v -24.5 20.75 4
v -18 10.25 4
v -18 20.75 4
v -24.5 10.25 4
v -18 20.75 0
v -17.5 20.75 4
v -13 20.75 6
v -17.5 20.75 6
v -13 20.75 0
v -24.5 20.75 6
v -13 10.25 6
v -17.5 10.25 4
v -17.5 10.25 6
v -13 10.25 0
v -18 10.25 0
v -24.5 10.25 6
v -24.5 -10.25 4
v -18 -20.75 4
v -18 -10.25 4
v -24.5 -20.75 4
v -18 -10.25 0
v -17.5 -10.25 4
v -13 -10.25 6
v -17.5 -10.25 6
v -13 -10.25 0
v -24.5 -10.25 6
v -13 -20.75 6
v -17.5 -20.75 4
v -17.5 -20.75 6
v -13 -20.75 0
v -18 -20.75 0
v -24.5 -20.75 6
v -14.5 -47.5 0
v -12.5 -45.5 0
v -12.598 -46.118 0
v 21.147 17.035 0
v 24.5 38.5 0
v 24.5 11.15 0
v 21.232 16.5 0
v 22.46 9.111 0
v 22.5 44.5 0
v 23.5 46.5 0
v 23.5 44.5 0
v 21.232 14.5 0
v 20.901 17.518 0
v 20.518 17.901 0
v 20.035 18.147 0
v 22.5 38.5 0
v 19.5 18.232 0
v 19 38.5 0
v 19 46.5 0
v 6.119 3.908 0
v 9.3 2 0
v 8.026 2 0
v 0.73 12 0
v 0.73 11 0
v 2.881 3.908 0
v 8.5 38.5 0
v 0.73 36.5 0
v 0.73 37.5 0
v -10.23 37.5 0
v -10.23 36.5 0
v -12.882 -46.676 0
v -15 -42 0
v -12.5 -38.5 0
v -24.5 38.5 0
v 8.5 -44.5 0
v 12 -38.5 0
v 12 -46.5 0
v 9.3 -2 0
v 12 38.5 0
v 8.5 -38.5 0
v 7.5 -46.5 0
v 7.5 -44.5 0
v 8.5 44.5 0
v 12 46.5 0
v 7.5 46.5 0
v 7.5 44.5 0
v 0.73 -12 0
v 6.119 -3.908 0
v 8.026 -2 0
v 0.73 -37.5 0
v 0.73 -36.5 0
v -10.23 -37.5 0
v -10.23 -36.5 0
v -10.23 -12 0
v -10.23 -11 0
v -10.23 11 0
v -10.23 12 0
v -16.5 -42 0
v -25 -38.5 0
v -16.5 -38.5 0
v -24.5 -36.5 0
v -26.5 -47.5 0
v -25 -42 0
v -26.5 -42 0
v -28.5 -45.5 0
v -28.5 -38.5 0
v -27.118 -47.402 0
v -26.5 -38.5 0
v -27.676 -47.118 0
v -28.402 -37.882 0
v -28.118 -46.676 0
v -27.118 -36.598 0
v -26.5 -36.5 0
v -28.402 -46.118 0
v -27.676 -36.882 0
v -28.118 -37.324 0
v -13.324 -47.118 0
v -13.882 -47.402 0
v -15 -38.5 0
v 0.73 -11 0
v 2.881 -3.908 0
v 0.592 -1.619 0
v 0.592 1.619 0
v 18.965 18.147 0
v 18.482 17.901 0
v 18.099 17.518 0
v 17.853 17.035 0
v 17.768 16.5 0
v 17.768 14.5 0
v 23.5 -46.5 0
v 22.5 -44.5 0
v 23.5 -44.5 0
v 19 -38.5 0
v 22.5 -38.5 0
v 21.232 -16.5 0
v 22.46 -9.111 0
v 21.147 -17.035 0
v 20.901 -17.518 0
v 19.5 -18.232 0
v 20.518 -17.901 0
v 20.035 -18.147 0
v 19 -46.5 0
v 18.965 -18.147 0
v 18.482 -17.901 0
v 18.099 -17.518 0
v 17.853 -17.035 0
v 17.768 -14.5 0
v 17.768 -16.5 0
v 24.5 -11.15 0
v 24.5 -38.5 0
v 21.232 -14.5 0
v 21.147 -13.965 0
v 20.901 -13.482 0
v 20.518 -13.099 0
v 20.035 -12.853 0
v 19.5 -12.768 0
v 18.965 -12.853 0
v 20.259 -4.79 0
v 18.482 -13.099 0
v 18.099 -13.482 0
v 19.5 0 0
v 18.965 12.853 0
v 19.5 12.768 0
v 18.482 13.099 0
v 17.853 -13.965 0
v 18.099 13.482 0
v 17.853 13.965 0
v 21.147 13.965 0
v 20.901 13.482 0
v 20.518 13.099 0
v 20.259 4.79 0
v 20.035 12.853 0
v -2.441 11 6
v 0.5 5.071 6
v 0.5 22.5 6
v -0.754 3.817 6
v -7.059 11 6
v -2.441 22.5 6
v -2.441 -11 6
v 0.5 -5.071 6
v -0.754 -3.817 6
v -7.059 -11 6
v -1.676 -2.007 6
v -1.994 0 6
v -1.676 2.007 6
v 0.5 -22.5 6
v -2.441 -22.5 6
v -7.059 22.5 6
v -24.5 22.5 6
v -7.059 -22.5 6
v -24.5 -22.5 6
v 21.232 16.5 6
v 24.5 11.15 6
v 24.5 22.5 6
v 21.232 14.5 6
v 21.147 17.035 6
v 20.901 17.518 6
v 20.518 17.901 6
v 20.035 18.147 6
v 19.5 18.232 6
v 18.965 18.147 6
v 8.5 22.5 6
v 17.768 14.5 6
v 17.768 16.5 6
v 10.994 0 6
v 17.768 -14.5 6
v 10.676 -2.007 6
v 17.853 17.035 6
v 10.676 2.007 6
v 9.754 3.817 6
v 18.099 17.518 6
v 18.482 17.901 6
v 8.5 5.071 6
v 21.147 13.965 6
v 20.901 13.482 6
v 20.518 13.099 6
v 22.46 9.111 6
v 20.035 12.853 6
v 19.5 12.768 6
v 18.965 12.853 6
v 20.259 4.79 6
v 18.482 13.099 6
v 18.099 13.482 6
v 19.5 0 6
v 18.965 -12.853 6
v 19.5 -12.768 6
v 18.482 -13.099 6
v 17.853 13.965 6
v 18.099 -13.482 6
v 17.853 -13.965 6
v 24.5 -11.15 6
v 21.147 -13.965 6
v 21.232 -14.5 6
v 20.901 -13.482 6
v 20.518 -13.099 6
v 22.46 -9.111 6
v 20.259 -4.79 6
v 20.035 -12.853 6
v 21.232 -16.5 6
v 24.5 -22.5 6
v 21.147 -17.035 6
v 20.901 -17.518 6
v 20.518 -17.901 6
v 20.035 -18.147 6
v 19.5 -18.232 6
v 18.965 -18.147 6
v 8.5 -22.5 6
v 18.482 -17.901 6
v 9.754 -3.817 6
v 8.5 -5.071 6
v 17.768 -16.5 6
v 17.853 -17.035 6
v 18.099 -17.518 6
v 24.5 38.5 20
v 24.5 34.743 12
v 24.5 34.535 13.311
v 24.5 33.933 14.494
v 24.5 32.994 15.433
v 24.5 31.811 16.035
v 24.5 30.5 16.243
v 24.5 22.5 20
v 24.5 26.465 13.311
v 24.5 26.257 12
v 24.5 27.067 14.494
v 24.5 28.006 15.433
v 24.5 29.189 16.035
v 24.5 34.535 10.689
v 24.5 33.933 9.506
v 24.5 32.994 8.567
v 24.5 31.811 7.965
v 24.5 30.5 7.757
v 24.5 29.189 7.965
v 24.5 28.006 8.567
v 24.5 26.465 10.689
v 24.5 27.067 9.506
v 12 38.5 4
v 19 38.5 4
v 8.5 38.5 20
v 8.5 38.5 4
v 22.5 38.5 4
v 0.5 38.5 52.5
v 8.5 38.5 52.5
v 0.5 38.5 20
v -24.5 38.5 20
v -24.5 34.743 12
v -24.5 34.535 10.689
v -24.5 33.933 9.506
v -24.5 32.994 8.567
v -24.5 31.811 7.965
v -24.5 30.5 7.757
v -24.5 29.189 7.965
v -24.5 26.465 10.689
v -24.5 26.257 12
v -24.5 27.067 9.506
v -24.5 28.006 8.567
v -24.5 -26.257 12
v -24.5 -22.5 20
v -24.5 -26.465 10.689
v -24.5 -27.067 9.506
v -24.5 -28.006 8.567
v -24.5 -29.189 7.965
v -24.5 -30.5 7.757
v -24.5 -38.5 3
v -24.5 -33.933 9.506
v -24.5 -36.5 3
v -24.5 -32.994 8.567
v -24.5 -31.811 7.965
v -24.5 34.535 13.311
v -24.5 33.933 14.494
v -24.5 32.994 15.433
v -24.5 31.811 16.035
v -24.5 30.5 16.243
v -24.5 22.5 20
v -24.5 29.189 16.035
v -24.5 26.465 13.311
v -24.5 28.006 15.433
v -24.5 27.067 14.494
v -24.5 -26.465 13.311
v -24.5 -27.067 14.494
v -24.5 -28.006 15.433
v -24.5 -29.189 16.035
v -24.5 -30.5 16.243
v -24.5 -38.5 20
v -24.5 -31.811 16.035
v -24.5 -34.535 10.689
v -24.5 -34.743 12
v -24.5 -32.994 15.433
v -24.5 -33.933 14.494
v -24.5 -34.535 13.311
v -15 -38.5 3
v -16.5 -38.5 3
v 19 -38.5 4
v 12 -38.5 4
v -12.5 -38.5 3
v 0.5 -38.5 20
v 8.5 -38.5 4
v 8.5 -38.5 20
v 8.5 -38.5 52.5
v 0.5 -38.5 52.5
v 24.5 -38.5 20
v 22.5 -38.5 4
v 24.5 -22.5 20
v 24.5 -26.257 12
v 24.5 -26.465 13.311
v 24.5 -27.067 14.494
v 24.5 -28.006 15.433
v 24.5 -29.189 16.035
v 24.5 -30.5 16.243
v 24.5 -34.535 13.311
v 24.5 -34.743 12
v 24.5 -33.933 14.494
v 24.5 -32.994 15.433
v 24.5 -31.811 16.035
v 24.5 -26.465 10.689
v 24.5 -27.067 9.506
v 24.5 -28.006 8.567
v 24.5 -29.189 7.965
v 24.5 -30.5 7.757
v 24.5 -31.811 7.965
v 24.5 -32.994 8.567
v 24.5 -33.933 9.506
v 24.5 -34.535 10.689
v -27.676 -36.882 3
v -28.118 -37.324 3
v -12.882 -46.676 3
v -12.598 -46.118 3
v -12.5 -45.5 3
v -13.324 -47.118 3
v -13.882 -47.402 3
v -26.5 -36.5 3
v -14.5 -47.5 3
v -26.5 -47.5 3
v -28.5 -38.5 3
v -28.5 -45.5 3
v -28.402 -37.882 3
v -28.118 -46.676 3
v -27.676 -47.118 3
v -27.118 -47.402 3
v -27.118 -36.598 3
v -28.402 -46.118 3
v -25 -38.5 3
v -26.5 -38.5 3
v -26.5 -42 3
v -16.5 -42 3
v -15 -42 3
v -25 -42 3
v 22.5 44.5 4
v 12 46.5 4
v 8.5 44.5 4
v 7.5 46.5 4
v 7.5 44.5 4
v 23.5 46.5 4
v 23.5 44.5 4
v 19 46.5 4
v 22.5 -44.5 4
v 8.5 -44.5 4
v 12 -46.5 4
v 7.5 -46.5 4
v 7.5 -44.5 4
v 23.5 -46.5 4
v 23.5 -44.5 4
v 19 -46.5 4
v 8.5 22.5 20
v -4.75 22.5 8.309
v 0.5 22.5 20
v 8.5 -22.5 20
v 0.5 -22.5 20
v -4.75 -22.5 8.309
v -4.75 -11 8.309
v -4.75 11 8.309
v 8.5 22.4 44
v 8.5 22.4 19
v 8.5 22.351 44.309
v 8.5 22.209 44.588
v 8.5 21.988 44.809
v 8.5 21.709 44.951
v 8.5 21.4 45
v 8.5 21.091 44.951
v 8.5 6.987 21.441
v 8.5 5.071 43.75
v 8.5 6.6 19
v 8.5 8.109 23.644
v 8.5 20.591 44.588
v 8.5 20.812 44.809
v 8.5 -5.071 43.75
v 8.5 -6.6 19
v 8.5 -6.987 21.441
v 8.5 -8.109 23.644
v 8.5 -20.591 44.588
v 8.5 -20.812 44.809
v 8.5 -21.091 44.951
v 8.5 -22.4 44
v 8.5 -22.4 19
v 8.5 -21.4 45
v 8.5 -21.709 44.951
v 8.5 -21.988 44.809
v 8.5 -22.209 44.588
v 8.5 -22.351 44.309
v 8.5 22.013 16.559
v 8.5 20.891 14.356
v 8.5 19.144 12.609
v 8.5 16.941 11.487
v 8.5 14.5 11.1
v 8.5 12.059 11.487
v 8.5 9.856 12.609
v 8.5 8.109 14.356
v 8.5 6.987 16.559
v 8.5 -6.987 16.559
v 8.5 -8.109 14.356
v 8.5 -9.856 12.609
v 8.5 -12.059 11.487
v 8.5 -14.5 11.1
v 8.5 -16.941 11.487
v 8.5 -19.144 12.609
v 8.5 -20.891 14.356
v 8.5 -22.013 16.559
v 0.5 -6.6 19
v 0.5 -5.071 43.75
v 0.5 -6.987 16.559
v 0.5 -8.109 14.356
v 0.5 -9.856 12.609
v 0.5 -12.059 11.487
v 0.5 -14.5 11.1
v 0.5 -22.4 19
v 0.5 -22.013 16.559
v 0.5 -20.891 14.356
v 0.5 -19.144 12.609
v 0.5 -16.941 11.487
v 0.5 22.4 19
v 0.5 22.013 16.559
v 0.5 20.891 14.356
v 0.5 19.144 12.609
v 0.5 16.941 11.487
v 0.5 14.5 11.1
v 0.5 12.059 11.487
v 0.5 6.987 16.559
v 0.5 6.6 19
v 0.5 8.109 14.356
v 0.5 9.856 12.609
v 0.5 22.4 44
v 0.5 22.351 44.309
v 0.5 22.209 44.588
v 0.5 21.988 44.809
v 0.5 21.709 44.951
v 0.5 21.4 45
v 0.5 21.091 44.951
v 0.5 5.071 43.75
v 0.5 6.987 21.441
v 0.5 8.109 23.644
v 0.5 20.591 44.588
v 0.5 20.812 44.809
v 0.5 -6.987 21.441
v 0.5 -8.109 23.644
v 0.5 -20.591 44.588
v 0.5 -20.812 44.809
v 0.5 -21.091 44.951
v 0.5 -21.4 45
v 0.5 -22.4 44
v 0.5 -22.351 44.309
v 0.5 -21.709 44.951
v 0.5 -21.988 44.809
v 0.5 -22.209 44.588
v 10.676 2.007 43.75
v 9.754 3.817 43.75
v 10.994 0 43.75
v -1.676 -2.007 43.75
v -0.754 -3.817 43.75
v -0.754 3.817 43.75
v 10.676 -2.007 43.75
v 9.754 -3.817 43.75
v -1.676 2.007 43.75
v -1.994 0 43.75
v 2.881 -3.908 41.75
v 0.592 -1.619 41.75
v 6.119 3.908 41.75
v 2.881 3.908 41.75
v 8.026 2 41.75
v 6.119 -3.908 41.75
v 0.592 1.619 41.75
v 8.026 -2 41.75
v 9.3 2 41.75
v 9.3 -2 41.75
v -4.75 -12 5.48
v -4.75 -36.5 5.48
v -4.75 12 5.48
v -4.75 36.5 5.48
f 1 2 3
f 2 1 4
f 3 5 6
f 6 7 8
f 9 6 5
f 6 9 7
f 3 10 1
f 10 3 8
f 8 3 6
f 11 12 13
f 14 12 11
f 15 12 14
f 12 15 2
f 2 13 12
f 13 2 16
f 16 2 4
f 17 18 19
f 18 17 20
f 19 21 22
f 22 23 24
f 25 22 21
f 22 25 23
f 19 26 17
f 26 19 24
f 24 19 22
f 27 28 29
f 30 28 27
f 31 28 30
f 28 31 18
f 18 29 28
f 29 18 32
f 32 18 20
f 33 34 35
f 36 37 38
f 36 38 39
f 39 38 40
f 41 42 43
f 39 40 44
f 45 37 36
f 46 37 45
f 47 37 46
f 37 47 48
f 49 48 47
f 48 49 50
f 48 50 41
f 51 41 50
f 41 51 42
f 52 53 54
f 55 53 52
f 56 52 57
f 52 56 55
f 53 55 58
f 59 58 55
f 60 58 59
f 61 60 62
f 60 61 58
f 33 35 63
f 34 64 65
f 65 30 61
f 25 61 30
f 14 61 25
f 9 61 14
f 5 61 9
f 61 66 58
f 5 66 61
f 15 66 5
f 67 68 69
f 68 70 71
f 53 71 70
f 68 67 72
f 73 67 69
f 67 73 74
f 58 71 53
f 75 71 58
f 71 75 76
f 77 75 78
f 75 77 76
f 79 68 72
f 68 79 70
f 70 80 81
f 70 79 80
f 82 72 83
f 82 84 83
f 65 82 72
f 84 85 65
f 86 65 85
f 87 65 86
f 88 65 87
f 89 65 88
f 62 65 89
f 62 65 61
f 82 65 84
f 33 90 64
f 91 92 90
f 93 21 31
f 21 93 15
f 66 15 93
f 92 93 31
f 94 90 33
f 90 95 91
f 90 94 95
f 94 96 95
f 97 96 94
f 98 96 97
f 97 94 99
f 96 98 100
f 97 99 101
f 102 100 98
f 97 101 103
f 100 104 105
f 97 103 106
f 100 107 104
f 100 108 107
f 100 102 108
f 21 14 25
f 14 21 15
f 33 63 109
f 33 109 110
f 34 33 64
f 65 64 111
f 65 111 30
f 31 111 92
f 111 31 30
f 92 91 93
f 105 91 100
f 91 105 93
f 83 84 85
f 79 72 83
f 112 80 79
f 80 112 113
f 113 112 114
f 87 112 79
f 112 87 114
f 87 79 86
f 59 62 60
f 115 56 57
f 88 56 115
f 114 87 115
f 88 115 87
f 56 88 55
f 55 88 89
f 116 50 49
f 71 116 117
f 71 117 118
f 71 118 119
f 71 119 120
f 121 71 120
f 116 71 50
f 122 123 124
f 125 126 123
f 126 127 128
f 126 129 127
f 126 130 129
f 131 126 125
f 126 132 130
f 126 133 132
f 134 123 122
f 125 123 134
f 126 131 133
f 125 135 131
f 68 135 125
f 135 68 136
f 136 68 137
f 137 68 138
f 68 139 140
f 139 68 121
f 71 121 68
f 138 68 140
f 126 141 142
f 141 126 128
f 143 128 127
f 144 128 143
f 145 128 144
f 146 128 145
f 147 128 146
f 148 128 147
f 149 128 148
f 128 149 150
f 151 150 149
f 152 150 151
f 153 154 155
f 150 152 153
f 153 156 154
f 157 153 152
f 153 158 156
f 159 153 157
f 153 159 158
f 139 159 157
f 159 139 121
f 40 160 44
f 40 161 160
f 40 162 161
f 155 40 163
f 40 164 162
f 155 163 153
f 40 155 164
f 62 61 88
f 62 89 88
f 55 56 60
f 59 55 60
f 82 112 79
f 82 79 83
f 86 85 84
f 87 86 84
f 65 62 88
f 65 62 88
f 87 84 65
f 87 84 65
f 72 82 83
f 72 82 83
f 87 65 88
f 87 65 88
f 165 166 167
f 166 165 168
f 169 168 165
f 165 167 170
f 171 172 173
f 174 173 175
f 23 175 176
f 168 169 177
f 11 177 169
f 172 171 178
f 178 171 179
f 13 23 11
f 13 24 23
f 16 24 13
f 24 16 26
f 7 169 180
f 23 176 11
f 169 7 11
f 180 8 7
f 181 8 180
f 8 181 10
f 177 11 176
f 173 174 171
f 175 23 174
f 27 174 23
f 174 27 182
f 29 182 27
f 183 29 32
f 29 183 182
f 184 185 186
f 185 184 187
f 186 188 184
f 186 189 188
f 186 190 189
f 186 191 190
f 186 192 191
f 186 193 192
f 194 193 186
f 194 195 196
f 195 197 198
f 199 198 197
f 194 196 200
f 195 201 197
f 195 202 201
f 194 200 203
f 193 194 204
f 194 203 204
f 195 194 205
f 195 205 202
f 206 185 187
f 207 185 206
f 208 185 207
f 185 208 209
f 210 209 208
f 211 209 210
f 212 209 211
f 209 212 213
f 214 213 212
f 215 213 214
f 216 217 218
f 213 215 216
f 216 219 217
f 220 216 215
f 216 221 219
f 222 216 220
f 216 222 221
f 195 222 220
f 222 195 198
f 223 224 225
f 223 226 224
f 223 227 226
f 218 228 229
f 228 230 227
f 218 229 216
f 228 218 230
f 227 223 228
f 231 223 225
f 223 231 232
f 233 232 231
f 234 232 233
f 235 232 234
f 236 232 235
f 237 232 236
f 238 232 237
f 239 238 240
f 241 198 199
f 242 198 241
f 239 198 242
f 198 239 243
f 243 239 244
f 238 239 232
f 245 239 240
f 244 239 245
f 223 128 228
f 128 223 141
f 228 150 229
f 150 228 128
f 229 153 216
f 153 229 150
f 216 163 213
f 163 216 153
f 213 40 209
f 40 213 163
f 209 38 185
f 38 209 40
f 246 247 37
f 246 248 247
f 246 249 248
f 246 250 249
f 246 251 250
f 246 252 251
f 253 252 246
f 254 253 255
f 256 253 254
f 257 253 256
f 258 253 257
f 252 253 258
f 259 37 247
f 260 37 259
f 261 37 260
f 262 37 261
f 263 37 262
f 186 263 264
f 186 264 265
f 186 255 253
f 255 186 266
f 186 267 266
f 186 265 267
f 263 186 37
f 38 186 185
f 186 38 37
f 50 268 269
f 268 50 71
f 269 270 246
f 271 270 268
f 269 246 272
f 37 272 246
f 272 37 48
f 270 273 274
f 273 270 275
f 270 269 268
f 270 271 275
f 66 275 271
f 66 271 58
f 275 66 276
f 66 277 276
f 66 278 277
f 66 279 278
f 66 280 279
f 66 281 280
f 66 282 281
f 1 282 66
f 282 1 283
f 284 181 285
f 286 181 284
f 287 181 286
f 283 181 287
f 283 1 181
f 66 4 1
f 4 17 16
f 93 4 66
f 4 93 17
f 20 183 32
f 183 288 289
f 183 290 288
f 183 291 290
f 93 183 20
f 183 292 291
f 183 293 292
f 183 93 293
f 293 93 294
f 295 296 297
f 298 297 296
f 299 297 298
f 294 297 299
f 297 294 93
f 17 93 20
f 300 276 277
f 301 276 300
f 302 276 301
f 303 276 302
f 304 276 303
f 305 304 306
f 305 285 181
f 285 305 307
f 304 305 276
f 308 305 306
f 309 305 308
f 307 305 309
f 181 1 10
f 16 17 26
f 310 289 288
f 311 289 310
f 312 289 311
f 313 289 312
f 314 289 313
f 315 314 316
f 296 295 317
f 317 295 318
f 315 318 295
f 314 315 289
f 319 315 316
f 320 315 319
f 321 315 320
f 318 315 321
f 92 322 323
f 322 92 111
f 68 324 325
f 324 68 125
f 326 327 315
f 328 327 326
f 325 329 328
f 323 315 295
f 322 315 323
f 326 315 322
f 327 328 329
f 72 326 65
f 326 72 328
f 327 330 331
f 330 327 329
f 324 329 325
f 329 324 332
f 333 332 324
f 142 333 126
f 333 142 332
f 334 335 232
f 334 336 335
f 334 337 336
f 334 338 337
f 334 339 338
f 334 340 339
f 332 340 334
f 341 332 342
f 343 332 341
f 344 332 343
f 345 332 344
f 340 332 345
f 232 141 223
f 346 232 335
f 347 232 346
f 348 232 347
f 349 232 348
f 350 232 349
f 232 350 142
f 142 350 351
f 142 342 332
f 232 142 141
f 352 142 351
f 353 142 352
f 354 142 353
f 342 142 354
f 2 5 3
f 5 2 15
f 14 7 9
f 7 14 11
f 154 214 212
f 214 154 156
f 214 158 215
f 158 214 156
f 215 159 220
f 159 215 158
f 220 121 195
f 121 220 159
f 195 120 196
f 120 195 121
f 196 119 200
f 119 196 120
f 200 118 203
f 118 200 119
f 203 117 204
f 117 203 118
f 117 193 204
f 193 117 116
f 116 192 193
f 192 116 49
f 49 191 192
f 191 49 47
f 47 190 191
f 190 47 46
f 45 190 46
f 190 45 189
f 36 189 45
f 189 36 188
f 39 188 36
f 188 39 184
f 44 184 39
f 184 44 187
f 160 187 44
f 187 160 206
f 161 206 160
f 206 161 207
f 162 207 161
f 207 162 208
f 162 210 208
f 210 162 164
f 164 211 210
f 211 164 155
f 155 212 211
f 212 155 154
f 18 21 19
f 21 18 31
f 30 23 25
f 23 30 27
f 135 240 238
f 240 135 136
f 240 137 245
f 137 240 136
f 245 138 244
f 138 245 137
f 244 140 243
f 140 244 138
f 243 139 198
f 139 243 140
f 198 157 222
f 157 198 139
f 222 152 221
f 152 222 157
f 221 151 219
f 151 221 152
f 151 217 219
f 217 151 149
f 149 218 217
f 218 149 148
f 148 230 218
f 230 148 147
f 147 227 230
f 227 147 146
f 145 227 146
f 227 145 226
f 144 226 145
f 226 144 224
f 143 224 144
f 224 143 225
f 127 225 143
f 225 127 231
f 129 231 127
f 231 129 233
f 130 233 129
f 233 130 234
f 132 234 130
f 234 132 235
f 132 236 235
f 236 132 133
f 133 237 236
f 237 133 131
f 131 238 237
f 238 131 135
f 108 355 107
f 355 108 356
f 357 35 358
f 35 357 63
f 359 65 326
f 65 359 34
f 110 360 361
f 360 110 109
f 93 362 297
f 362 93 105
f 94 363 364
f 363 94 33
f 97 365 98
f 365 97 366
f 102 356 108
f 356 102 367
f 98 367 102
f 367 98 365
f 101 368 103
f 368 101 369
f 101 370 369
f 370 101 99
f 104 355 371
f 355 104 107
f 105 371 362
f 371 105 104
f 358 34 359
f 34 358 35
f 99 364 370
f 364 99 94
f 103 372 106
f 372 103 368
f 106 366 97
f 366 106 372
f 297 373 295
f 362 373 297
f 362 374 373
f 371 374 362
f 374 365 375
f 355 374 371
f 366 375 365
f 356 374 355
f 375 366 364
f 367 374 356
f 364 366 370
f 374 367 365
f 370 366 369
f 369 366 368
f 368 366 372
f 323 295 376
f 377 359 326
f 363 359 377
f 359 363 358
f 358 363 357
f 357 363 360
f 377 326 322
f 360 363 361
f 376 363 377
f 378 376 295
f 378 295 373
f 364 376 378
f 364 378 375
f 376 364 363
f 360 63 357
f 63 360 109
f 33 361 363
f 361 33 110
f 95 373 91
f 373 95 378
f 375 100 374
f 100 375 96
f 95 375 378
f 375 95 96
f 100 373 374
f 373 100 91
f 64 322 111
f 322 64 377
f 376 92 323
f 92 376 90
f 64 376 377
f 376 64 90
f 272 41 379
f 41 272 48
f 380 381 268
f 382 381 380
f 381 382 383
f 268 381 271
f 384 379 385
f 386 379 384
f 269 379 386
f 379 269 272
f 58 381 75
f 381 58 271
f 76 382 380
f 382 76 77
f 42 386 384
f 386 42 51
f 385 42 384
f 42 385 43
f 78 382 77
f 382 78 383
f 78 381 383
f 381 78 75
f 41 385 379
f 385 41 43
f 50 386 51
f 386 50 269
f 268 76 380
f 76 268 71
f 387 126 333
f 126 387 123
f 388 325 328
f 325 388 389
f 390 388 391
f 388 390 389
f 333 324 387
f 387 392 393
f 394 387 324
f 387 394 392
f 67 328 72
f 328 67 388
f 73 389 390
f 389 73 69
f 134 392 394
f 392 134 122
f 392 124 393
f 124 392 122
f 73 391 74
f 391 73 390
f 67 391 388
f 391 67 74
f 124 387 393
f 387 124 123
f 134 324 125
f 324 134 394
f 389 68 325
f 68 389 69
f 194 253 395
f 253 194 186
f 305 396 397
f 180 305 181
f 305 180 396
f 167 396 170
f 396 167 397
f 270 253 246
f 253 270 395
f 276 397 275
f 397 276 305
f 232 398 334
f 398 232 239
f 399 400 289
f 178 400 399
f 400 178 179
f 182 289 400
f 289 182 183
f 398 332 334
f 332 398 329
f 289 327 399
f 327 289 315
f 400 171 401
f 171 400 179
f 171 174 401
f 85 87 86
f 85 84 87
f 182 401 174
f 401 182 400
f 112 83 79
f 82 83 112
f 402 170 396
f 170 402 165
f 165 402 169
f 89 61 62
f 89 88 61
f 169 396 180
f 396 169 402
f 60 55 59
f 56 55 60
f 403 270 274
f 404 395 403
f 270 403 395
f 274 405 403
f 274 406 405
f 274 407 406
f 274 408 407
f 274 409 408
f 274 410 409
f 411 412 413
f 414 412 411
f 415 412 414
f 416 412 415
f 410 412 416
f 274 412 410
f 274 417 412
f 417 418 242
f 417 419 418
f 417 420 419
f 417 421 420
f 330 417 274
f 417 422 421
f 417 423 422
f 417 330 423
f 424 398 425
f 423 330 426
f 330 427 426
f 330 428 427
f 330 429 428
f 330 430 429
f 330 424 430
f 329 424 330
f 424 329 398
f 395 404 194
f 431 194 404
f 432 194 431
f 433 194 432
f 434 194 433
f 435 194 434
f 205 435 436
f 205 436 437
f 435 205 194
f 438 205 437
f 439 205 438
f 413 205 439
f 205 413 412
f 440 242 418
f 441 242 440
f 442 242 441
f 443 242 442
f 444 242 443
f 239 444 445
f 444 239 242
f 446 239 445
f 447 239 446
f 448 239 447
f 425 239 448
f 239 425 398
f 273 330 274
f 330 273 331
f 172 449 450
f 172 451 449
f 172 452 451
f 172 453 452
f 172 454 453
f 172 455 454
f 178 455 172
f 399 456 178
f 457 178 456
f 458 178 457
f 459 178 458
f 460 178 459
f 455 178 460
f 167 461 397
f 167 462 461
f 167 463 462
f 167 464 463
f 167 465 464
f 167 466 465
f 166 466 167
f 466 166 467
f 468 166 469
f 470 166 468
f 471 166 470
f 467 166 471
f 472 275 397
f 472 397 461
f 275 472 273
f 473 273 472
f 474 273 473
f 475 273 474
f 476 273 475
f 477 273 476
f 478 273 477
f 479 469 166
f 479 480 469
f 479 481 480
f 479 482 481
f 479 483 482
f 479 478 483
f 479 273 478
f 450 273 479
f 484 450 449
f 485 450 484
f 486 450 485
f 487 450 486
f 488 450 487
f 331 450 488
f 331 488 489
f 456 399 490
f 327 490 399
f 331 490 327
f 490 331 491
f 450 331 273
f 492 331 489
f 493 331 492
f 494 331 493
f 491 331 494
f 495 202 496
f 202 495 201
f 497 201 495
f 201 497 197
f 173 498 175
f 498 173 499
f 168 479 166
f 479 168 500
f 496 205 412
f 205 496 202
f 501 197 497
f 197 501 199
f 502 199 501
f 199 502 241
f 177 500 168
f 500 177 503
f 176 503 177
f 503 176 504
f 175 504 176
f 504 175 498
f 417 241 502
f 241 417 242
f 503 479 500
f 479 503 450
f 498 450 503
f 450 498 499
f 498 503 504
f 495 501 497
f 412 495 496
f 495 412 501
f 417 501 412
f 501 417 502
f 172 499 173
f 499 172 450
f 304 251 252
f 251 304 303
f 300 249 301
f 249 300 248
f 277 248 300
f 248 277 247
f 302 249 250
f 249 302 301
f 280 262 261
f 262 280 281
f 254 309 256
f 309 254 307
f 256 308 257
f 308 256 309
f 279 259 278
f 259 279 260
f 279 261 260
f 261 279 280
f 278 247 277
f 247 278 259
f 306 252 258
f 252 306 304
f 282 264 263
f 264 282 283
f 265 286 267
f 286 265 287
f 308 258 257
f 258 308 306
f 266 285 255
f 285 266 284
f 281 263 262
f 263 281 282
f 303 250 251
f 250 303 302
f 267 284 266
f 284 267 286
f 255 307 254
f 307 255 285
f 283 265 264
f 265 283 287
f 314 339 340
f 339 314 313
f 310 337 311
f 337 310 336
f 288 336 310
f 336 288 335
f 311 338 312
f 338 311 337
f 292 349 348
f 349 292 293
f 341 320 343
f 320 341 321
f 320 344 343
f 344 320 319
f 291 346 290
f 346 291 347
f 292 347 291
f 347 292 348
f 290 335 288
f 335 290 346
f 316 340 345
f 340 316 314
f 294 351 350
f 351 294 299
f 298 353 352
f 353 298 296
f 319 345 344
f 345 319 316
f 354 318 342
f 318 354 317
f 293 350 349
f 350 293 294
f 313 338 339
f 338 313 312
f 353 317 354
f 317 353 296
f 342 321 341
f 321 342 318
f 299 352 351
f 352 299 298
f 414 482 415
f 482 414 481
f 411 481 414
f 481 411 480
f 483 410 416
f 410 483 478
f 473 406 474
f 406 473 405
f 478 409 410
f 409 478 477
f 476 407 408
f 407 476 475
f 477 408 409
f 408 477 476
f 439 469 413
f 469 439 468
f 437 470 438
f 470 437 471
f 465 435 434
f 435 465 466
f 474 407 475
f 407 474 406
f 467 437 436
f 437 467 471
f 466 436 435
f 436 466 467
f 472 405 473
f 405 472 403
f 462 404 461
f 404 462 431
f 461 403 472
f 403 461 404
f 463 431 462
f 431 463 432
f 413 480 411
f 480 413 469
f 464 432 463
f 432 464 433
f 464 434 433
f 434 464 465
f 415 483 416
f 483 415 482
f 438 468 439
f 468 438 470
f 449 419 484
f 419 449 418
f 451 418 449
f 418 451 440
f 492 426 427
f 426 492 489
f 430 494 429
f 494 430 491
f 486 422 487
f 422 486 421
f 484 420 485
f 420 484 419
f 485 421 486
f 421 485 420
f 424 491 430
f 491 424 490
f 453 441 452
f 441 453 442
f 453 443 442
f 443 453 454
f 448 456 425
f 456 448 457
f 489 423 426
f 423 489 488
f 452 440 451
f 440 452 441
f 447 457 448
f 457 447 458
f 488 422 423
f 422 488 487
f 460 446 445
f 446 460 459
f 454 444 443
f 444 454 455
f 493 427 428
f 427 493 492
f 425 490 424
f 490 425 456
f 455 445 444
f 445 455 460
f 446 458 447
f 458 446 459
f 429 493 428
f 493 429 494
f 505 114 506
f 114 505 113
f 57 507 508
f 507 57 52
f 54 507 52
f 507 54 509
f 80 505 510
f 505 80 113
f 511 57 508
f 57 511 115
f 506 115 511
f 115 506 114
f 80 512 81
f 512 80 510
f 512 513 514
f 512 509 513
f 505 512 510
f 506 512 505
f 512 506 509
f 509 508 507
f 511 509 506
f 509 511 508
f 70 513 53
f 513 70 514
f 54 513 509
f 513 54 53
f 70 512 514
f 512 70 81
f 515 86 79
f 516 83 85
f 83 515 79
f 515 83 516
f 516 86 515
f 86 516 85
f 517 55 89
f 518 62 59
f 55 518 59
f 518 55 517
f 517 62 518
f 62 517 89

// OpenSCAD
include <wallace2.scad>;

//base_end();

//translate([motor_casing+10,0,0]) 

base_end2();


module base_end2() difference() {

	// top plate & nema mount
	union(){
		difference(){
		linear_extrude(height = 6, convexity = 5) difference() {
			square([yz_motor_distance + motor_casing - motor_screw_spacing + 10, motor_casing + rod_size * 4], center = true);
			// nema motor arcs
			for(end = [1]) {
				// motor mount drills
				for(side = [1,-1]) translate([end * (yz_motor_distance + motor_casing - motor_screw_spacing) / 2, side * motor_screw_spacing / 2, 0]) {
					// We create a hull, because the NEMA screw spacing tend to be off on some motors.
					hull(){
						translate([0,side*1,0]) circle(m3_size * da6);
						translate([0,side*-1,0]) circle(m3_size * da6);
					}
				}
				translate([end * (yz_motor_distance + motor_casing) / 2, 0, 0]) #circle(motor_screw_spacing / 2);
			}
			// clamping holes for bearing retainer
			for(side = [1,-1]){
				translate([-1 * (yz_motor_distance + motor_casing - motor_screw_spacing) / 2+4, side * motor_screw_spacing / 2, 0]) square([4+1,10.5],center=true);

			}
		}

		// extra block removed for retainer clamp fit...
		for(side = [1,-1]){
				translate([-7 -1 * (yz_motor_distance + motor_casing - motor_screw_spacing) / 2+4, side * motor_screw_spacing / 2 , 7]) cube([10,10.5,6],center=true);
			}

		}


				
		// stopswitch retainer
		mirror([0,1,0]) translate([-(yz_motor_distance + motor_casing - motor_screw_spacing + 10)/2-4,(motor_casing + rod_size * 4)/2-2,0]){
			difference(){
				translate([2,2,0])minkowski(){
					cube([16-4,10-3,2]);
					cylinder(r=2,h=1);
				}			
				translate([2,2,-1]) #cube([1.5,3.5,4]);
				translate([2+10,2,-1]) #cube([1.5,3.5,4]);
			}
		}
		
		// clamp for holding cables
		for(side = [0, 1]) mirror([0, side, 0]) 
		translate([(yz_motor_distance + motor_casing - motor_screw_spacing + 10)/2-16,(motor_casing + rod_size * 4)/2-2,0]){
			difference(){
					union(){
						cube([14,10,4]);
						translate([-1,10-2,0])cube([16,2,4]);
					}
					translate([7/2,0,-1])cube([7,11,4+2]);
			}
		}
		
		
		
		// X-rod retainer blocks
		translate([0,0,rod_size/2]){
			for(side = [1, -1]) translate([0, side * 0.5 *(motor_casing + rod_size * 4), 0]) rotate([90, 0, 90]) {
				translate([-rod_size*side,rod_size,]) 
					cube([rod_size*2,rod_size*2,yz_motor_distance + motor_casing - motor_screw_spacing + 10],center=true);
			}
		}

		// foot stand
		translate([yz_motor_distance / 2 - rod_size, 0, (end_height-motor_casing / 4)/2*1.2]) {
			cube([rod_size,motor_casing + rod_size * 4,(end_height-motor_casing / 4)*1.2],center=true);
		}

		// cylinder around Z-rods  	
		translate([yz_motor_distance / 2 - rod_size, 0, 0]) {
			cylinder(r=rod_size * da8 * 1.5, h=end_height-motor_casing / 4);
		}		


	// extra flesh around bottom of bearing retainers
	translate([-yz_motor_distance / 2 + bearing_size / 2, 0, -bearing_size * sqrt(2) / 4]) rotate([90, -45, 0]) {
		for(side = [0, 1]) mirror([0, 0, side]) translate([0, 0, rod_size / 2 + 8-1]) {
			difference(){
				cube([bearing_size / 2+2, bearing_size / 2+2, bearing_length+2]);
				cylinder(r = bearing_size / 2, h = bearing_length+2, center = false, $fn = 80);
			}
		}
	}



}
	
	// X-rod holes
	translate([0,0,rod_size/2]){
		for(side = [1, -1]) translate([0, side * 0.5 *(motor_casing + rod_size * 4), 0]) rotate([90, 0, 90]) {
			translate([-rod_size*side,rod_size,0])
				#cylinder(r = rod_size * da8 * .98 , h = yz_motor_distance + motor_casing + 20, center = true);
		}
	}

	// foot holes
	translate([0,0,rod_size/2]){
		for(side = [1, -1]) translate([0, side * 0.5 *(motor_casing), 0]) rotate([90, 0, 90]) {
			translate([-rod_size*side,15,0]) {
				hull(){
				cylinder(r = 7.9, h = yz_motor_distance + motor_casing + 20, center = true);
				translate([side*(7.9-1),25,0])cylinder(r = 1, h = yz_motor_distance + motor_casing + 20, center = true);
				}
			}
		}
	}

	// Z-rod holes
	translate([yz_motor_distance / 2 - rod_size, 0, 0]) {
		translate([0, 0, -2])  {
			rotate(180 / 8) #cylinder(r=rod_size * da8 -0.1, h=end_height-motor_casing / 4, $fn = 8);
			translate([0, -rod_size / 4, 0]) #cube([rod_size * .6, rod_size / 2,end_height-motor_casing / 4]);
		}

	}
	
	
	// bearing retainers
	translate([-yz_motor_distance / 2 + bearing_size / 2, 0, -bearing_size * sqrt(2) / 4]) rotate([90, -45, 0]) {
//		%cylinder(r = rod_size * da8, h = 100, center = true, $fn = 8);
		for(side = [0, 1]) mirror([0, 0, side]) translate([0, 0, rod_size / 2 + 8]) {
			cylinder(r = bearing_size / 2, h = bearing_length, center = false, $fn = 80);
			cube([bearing_size / 2, bearing_size / 2, bearing_length]);
		}
	}

}


module base_end() difference() {
	linear_extrude(height = end_height, convexity = 5) difference() {
		square([yz_motor_distance + motor_casing - motor_screw_spacing + 10, motor_casing + rod_size * 4], center = true);
		// nema motor arcs
		for(end = [1, -1]) {
			for(side = [1, -1]) translate([end * (yz_motor_distance + motor_casing - motor_screw_spacing) / 2, side * motor_screw_spacing / 2, 0]) circle(m3_size * da6, $fn = 6);
			translate([end * (yz_motor_distance + motor_casing) / 2, 0, 0]) #circle(motor_screw_spacing / 2);
		}
	}
	for(end = [1, -1]) translate([end * (yz_motor_distance + motor_casing) / 2, 0, 3]) linear_extrude(height = end_height, convexity = 5) square(motor_casing, center = true);
	for(side = [1, -1]) translate([0, side * (motor_casing / 2 + rod_size), rod_size / 2 + bearing_size / 2]) rotate([90, 180 / 8, 90]) {
		cylinder(r = rod_size * da8, h = yz_motor_distance + motor_casing + 20, center = true, $fn = 8);
		%translate([0, 0, -70]) cylinder(r = rod_size * da8, h = 200, center = true, $fn = 8);
	}
	translate([0, 0, end_height]) scale([1, 1, .5]) rotate([90, 0, 90]) cylinder(r = motor_casing / 2, h = yz_motor_distance + 20, center = true);
	translate([yz_motor_distance / 2 - rod_size, 0, 0]) {
		translate([0, 0, -3]) linear_extrude(height = end_height - motor_casing / 4, convexity = 5) {
			rotate(180 / 8) circle(rod_size * da8, $fn = 8);
			translate([0, -rod_size / 4, 0]) square([rod_size * .6, rod_size / 2]);
		}

	}
	translate([-yz_motor_distance / 2 + bearing_size / 2, 0, -bearing_size * sqrt(2) / 4]) rotate([90, -45, 0]) {
		%cylinder(r = rod_size * da8, h = 100, center = true, $fn = 8);
		for(side = [0, 1]) mirror([0, 0, side]) translate([0, 0, rod_size / 2 + 8]) {
			cylinder(r = bearing_size / 2, h = bearing_length, center = false, $fn = 80);
			cube([bearing_size / 2, bearing_size / 2, bearing_length]);
		}
	}
	translate([0, 0, end_height - rod_size * 1.5]) rotate([90, 180 / 8, 0]) cylinder(r = rod_size * da8, h = motor_casing + rod_size * 5, $fn = 8, center = true);
	%translate([0, 0, end_height - rod_size * 1.5]) rotate([90, 180 / 8, 0]) cylinder(r = rod_size * da8, h = 100, $fn = 8, center = true);

}
